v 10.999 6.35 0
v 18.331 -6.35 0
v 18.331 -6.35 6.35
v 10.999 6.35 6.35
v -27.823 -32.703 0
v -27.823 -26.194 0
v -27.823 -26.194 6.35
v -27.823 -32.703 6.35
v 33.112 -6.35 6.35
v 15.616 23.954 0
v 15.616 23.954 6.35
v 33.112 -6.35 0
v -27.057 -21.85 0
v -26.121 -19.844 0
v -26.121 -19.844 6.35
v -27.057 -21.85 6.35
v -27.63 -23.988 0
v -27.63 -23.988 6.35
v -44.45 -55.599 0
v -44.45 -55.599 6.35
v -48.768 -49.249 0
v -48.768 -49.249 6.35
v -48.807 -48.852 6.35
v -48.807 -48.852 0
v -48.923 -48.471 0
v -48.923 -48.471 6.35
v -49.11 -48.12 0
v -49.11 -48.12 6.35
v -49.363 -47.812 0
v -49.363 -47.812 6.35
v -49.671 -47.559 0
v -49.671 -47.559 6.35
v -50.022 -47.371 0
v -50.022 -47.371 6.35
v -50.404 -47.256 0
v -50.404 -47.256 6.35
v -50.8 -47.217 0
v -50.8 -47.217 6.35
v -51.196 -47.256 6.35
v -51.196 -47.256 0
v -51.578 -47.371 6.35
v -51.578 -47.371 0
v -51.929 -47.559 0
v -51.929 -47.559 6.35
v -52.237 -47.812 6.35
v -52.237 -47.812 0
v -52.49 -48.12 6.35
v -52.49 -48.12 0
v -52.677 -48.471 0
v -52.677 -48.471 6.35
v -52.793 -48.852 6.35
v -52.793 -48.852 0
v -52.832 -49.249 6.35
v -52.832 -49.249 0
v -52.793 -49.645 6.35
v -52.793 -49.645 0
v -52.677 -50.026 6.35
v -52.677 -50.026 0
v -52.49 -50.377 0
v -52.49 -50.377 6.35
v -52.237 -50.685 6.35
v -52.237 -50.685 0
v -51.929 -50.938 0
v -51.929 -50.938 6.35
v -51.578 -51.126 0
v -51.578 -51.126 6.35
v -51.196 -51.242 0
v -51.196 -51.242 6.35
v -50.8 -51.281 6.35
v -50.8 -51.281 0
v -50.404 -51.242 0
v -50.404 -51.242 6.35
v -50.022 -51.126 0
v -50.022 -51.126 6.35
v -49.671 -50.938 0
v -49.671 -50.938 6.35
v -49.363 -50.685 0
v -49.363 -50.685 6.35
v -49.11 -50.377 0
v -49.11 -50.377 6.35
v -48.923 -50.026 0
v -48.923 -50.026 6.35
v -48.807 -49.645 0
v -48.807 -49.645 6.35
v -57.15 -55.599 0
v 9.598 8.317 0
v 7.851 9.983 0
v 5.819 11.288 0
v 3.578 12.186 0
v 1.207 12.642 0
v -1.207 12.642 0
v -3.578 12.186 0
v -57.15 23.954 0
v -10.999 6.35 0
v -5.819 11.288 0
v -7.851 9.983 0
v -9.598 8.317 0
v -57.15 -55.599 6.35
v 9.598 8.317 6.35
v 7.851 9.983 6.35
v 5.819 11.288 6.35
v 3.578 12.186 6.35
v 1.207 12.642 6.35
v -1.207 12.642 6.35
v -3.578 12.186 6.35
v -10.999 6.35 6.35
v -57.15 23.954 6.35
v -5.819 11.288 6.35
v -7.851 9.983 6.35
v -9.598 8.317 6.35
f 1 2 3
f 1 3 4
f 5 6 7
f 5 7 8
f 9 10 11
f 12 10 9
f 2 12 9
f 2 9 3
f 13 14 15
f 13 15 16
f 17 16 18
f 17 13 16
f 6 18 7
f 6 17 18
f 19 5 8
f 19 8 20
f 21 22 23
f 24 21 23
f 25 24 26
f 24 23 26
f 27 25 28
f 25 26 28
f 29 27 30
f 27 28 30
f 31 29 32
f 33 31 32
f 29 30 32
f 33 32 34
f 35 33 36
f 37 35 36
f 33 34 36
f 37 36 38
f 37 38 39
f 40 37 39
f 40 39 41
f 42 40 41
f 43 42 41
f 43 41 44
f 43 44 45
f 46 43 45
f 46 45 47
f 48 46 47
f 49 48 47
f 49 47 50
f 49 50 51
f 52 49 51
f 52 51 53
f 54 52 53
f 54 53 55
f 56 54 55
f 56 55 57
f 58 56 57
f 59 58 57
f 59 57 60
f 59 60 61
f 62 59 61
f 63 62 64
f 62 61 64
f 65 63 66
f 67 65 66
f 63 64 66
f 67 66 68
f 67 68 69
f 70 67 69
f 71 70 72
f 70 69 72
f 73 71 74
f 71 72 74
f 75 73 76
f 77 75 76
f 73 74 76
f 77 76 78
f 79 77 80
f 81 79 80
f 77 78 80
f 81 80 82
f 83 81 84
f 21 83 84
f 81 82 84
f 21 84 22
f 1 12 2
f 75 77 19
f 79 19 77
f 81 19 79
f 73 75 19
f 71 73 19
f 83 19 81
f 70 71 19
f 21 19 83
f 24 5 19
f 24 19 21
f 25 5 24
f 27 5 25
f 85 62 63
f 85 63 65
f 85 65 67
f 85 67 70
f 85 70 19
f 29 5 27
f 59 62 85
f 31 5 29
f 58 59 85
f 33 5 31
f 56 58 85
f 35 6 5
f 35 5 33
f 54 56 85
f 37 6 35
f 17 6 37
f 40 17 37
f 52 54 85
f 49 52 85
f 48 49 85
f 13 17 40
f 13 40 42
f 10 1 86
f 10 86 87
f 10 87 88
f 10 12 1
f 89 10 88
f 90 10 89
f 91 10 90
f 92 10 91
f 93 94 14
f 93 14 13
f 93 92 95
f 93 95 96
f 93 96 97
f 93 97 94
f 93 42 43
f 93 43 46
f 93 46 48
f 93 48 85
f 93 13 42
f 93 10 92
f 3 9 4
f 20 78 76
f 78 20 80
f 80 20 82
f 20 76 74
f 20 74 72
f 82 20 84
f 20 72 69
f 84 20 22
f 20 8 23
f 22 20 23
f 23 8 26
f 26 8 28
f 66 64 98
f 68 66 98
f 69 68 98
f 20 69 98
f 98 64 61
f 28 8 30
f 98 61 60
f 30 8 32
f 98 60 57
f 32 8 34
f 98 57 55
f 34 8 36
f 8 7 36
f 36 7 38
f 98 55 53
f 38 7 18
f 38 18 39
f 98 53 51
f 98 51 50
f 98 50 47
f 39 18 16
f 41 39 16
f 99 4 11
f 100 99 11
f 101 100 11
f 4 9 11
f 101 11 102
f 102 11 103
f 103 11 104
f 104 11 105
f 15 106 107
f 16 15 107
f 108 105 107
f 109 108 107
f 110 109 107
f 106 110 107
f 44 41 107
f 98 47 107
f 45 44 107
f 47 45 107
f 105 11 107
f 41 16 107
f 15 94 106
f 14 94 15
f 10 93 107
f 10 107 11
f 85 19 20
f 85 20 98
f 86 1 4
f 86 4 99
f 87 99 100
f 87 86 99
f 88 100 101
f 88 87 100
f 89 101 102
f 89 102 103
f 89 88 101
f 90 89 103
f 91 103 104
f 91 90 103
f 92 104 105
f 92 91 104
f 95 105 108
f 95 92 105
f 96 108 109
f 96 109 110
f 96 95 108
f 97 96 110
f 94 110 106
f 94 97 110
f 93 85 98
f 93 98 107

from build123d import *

# Parameters (mm, degrees)
BOSS_EXTRUDE1_DEPTH = 6.35
SKETCH3_R           = 2.032
CUT_EXTRUDE1_DEPTH  = 80.985269666


with BuildPart() as part:
    # Sketch1 → Boss-Extrude1 (new body)
    with BuildSketch(Plane.XY):
        with BuildLine():
            Line((-10.998522628, 6.35), (-26.121491239, -19.843749996))
            ThreePointArc((-26.121491239, -19.843749996), (-27.390226605, -22.906748123), (-27.822968611, -26.193749996))
            Line((-27.822968611, -26.193749996), (-27.822968611, -32.702820897))
            Line((-27.822968611, -32.702820897), (-44.45, -55.598546415))
            Line((-44.45, -55.598546415), (-57.15, -55.598546415))
            Line((-57.15, -55.598546415), (-57.15, 23.954310777))
            Line((-57.15, 23.954310777), (15.615566787, 23.954310777))
            Line((15.615566787, 23.954310777), (33.111768772, -6.35))
            Line((33.111768772, -6.35), (18.330871047, -6.35))
            Line((18.330871047, -6.35), (10.998522628, 6.35))
            ThreePointArc((10.998522628, 6.35), (0, 12.7), (-10.998522628, 6.35))
        make_face()
    extrude(amount=BOSS_EXTRUDE1_DEPTH)

    # Sketch3 → Cut-Extrude1 (cut, through all)
    with BuildSketch(Plane.XY.offset(6.35)):
        with Locations((-50.8, -49.248546415)):
            Circle(SKETCH3_R)
    extrude(amount=-CUT_EXTRUDE1_DEPTH, mode=Mode.SUBTRACT)


solid = part.part
